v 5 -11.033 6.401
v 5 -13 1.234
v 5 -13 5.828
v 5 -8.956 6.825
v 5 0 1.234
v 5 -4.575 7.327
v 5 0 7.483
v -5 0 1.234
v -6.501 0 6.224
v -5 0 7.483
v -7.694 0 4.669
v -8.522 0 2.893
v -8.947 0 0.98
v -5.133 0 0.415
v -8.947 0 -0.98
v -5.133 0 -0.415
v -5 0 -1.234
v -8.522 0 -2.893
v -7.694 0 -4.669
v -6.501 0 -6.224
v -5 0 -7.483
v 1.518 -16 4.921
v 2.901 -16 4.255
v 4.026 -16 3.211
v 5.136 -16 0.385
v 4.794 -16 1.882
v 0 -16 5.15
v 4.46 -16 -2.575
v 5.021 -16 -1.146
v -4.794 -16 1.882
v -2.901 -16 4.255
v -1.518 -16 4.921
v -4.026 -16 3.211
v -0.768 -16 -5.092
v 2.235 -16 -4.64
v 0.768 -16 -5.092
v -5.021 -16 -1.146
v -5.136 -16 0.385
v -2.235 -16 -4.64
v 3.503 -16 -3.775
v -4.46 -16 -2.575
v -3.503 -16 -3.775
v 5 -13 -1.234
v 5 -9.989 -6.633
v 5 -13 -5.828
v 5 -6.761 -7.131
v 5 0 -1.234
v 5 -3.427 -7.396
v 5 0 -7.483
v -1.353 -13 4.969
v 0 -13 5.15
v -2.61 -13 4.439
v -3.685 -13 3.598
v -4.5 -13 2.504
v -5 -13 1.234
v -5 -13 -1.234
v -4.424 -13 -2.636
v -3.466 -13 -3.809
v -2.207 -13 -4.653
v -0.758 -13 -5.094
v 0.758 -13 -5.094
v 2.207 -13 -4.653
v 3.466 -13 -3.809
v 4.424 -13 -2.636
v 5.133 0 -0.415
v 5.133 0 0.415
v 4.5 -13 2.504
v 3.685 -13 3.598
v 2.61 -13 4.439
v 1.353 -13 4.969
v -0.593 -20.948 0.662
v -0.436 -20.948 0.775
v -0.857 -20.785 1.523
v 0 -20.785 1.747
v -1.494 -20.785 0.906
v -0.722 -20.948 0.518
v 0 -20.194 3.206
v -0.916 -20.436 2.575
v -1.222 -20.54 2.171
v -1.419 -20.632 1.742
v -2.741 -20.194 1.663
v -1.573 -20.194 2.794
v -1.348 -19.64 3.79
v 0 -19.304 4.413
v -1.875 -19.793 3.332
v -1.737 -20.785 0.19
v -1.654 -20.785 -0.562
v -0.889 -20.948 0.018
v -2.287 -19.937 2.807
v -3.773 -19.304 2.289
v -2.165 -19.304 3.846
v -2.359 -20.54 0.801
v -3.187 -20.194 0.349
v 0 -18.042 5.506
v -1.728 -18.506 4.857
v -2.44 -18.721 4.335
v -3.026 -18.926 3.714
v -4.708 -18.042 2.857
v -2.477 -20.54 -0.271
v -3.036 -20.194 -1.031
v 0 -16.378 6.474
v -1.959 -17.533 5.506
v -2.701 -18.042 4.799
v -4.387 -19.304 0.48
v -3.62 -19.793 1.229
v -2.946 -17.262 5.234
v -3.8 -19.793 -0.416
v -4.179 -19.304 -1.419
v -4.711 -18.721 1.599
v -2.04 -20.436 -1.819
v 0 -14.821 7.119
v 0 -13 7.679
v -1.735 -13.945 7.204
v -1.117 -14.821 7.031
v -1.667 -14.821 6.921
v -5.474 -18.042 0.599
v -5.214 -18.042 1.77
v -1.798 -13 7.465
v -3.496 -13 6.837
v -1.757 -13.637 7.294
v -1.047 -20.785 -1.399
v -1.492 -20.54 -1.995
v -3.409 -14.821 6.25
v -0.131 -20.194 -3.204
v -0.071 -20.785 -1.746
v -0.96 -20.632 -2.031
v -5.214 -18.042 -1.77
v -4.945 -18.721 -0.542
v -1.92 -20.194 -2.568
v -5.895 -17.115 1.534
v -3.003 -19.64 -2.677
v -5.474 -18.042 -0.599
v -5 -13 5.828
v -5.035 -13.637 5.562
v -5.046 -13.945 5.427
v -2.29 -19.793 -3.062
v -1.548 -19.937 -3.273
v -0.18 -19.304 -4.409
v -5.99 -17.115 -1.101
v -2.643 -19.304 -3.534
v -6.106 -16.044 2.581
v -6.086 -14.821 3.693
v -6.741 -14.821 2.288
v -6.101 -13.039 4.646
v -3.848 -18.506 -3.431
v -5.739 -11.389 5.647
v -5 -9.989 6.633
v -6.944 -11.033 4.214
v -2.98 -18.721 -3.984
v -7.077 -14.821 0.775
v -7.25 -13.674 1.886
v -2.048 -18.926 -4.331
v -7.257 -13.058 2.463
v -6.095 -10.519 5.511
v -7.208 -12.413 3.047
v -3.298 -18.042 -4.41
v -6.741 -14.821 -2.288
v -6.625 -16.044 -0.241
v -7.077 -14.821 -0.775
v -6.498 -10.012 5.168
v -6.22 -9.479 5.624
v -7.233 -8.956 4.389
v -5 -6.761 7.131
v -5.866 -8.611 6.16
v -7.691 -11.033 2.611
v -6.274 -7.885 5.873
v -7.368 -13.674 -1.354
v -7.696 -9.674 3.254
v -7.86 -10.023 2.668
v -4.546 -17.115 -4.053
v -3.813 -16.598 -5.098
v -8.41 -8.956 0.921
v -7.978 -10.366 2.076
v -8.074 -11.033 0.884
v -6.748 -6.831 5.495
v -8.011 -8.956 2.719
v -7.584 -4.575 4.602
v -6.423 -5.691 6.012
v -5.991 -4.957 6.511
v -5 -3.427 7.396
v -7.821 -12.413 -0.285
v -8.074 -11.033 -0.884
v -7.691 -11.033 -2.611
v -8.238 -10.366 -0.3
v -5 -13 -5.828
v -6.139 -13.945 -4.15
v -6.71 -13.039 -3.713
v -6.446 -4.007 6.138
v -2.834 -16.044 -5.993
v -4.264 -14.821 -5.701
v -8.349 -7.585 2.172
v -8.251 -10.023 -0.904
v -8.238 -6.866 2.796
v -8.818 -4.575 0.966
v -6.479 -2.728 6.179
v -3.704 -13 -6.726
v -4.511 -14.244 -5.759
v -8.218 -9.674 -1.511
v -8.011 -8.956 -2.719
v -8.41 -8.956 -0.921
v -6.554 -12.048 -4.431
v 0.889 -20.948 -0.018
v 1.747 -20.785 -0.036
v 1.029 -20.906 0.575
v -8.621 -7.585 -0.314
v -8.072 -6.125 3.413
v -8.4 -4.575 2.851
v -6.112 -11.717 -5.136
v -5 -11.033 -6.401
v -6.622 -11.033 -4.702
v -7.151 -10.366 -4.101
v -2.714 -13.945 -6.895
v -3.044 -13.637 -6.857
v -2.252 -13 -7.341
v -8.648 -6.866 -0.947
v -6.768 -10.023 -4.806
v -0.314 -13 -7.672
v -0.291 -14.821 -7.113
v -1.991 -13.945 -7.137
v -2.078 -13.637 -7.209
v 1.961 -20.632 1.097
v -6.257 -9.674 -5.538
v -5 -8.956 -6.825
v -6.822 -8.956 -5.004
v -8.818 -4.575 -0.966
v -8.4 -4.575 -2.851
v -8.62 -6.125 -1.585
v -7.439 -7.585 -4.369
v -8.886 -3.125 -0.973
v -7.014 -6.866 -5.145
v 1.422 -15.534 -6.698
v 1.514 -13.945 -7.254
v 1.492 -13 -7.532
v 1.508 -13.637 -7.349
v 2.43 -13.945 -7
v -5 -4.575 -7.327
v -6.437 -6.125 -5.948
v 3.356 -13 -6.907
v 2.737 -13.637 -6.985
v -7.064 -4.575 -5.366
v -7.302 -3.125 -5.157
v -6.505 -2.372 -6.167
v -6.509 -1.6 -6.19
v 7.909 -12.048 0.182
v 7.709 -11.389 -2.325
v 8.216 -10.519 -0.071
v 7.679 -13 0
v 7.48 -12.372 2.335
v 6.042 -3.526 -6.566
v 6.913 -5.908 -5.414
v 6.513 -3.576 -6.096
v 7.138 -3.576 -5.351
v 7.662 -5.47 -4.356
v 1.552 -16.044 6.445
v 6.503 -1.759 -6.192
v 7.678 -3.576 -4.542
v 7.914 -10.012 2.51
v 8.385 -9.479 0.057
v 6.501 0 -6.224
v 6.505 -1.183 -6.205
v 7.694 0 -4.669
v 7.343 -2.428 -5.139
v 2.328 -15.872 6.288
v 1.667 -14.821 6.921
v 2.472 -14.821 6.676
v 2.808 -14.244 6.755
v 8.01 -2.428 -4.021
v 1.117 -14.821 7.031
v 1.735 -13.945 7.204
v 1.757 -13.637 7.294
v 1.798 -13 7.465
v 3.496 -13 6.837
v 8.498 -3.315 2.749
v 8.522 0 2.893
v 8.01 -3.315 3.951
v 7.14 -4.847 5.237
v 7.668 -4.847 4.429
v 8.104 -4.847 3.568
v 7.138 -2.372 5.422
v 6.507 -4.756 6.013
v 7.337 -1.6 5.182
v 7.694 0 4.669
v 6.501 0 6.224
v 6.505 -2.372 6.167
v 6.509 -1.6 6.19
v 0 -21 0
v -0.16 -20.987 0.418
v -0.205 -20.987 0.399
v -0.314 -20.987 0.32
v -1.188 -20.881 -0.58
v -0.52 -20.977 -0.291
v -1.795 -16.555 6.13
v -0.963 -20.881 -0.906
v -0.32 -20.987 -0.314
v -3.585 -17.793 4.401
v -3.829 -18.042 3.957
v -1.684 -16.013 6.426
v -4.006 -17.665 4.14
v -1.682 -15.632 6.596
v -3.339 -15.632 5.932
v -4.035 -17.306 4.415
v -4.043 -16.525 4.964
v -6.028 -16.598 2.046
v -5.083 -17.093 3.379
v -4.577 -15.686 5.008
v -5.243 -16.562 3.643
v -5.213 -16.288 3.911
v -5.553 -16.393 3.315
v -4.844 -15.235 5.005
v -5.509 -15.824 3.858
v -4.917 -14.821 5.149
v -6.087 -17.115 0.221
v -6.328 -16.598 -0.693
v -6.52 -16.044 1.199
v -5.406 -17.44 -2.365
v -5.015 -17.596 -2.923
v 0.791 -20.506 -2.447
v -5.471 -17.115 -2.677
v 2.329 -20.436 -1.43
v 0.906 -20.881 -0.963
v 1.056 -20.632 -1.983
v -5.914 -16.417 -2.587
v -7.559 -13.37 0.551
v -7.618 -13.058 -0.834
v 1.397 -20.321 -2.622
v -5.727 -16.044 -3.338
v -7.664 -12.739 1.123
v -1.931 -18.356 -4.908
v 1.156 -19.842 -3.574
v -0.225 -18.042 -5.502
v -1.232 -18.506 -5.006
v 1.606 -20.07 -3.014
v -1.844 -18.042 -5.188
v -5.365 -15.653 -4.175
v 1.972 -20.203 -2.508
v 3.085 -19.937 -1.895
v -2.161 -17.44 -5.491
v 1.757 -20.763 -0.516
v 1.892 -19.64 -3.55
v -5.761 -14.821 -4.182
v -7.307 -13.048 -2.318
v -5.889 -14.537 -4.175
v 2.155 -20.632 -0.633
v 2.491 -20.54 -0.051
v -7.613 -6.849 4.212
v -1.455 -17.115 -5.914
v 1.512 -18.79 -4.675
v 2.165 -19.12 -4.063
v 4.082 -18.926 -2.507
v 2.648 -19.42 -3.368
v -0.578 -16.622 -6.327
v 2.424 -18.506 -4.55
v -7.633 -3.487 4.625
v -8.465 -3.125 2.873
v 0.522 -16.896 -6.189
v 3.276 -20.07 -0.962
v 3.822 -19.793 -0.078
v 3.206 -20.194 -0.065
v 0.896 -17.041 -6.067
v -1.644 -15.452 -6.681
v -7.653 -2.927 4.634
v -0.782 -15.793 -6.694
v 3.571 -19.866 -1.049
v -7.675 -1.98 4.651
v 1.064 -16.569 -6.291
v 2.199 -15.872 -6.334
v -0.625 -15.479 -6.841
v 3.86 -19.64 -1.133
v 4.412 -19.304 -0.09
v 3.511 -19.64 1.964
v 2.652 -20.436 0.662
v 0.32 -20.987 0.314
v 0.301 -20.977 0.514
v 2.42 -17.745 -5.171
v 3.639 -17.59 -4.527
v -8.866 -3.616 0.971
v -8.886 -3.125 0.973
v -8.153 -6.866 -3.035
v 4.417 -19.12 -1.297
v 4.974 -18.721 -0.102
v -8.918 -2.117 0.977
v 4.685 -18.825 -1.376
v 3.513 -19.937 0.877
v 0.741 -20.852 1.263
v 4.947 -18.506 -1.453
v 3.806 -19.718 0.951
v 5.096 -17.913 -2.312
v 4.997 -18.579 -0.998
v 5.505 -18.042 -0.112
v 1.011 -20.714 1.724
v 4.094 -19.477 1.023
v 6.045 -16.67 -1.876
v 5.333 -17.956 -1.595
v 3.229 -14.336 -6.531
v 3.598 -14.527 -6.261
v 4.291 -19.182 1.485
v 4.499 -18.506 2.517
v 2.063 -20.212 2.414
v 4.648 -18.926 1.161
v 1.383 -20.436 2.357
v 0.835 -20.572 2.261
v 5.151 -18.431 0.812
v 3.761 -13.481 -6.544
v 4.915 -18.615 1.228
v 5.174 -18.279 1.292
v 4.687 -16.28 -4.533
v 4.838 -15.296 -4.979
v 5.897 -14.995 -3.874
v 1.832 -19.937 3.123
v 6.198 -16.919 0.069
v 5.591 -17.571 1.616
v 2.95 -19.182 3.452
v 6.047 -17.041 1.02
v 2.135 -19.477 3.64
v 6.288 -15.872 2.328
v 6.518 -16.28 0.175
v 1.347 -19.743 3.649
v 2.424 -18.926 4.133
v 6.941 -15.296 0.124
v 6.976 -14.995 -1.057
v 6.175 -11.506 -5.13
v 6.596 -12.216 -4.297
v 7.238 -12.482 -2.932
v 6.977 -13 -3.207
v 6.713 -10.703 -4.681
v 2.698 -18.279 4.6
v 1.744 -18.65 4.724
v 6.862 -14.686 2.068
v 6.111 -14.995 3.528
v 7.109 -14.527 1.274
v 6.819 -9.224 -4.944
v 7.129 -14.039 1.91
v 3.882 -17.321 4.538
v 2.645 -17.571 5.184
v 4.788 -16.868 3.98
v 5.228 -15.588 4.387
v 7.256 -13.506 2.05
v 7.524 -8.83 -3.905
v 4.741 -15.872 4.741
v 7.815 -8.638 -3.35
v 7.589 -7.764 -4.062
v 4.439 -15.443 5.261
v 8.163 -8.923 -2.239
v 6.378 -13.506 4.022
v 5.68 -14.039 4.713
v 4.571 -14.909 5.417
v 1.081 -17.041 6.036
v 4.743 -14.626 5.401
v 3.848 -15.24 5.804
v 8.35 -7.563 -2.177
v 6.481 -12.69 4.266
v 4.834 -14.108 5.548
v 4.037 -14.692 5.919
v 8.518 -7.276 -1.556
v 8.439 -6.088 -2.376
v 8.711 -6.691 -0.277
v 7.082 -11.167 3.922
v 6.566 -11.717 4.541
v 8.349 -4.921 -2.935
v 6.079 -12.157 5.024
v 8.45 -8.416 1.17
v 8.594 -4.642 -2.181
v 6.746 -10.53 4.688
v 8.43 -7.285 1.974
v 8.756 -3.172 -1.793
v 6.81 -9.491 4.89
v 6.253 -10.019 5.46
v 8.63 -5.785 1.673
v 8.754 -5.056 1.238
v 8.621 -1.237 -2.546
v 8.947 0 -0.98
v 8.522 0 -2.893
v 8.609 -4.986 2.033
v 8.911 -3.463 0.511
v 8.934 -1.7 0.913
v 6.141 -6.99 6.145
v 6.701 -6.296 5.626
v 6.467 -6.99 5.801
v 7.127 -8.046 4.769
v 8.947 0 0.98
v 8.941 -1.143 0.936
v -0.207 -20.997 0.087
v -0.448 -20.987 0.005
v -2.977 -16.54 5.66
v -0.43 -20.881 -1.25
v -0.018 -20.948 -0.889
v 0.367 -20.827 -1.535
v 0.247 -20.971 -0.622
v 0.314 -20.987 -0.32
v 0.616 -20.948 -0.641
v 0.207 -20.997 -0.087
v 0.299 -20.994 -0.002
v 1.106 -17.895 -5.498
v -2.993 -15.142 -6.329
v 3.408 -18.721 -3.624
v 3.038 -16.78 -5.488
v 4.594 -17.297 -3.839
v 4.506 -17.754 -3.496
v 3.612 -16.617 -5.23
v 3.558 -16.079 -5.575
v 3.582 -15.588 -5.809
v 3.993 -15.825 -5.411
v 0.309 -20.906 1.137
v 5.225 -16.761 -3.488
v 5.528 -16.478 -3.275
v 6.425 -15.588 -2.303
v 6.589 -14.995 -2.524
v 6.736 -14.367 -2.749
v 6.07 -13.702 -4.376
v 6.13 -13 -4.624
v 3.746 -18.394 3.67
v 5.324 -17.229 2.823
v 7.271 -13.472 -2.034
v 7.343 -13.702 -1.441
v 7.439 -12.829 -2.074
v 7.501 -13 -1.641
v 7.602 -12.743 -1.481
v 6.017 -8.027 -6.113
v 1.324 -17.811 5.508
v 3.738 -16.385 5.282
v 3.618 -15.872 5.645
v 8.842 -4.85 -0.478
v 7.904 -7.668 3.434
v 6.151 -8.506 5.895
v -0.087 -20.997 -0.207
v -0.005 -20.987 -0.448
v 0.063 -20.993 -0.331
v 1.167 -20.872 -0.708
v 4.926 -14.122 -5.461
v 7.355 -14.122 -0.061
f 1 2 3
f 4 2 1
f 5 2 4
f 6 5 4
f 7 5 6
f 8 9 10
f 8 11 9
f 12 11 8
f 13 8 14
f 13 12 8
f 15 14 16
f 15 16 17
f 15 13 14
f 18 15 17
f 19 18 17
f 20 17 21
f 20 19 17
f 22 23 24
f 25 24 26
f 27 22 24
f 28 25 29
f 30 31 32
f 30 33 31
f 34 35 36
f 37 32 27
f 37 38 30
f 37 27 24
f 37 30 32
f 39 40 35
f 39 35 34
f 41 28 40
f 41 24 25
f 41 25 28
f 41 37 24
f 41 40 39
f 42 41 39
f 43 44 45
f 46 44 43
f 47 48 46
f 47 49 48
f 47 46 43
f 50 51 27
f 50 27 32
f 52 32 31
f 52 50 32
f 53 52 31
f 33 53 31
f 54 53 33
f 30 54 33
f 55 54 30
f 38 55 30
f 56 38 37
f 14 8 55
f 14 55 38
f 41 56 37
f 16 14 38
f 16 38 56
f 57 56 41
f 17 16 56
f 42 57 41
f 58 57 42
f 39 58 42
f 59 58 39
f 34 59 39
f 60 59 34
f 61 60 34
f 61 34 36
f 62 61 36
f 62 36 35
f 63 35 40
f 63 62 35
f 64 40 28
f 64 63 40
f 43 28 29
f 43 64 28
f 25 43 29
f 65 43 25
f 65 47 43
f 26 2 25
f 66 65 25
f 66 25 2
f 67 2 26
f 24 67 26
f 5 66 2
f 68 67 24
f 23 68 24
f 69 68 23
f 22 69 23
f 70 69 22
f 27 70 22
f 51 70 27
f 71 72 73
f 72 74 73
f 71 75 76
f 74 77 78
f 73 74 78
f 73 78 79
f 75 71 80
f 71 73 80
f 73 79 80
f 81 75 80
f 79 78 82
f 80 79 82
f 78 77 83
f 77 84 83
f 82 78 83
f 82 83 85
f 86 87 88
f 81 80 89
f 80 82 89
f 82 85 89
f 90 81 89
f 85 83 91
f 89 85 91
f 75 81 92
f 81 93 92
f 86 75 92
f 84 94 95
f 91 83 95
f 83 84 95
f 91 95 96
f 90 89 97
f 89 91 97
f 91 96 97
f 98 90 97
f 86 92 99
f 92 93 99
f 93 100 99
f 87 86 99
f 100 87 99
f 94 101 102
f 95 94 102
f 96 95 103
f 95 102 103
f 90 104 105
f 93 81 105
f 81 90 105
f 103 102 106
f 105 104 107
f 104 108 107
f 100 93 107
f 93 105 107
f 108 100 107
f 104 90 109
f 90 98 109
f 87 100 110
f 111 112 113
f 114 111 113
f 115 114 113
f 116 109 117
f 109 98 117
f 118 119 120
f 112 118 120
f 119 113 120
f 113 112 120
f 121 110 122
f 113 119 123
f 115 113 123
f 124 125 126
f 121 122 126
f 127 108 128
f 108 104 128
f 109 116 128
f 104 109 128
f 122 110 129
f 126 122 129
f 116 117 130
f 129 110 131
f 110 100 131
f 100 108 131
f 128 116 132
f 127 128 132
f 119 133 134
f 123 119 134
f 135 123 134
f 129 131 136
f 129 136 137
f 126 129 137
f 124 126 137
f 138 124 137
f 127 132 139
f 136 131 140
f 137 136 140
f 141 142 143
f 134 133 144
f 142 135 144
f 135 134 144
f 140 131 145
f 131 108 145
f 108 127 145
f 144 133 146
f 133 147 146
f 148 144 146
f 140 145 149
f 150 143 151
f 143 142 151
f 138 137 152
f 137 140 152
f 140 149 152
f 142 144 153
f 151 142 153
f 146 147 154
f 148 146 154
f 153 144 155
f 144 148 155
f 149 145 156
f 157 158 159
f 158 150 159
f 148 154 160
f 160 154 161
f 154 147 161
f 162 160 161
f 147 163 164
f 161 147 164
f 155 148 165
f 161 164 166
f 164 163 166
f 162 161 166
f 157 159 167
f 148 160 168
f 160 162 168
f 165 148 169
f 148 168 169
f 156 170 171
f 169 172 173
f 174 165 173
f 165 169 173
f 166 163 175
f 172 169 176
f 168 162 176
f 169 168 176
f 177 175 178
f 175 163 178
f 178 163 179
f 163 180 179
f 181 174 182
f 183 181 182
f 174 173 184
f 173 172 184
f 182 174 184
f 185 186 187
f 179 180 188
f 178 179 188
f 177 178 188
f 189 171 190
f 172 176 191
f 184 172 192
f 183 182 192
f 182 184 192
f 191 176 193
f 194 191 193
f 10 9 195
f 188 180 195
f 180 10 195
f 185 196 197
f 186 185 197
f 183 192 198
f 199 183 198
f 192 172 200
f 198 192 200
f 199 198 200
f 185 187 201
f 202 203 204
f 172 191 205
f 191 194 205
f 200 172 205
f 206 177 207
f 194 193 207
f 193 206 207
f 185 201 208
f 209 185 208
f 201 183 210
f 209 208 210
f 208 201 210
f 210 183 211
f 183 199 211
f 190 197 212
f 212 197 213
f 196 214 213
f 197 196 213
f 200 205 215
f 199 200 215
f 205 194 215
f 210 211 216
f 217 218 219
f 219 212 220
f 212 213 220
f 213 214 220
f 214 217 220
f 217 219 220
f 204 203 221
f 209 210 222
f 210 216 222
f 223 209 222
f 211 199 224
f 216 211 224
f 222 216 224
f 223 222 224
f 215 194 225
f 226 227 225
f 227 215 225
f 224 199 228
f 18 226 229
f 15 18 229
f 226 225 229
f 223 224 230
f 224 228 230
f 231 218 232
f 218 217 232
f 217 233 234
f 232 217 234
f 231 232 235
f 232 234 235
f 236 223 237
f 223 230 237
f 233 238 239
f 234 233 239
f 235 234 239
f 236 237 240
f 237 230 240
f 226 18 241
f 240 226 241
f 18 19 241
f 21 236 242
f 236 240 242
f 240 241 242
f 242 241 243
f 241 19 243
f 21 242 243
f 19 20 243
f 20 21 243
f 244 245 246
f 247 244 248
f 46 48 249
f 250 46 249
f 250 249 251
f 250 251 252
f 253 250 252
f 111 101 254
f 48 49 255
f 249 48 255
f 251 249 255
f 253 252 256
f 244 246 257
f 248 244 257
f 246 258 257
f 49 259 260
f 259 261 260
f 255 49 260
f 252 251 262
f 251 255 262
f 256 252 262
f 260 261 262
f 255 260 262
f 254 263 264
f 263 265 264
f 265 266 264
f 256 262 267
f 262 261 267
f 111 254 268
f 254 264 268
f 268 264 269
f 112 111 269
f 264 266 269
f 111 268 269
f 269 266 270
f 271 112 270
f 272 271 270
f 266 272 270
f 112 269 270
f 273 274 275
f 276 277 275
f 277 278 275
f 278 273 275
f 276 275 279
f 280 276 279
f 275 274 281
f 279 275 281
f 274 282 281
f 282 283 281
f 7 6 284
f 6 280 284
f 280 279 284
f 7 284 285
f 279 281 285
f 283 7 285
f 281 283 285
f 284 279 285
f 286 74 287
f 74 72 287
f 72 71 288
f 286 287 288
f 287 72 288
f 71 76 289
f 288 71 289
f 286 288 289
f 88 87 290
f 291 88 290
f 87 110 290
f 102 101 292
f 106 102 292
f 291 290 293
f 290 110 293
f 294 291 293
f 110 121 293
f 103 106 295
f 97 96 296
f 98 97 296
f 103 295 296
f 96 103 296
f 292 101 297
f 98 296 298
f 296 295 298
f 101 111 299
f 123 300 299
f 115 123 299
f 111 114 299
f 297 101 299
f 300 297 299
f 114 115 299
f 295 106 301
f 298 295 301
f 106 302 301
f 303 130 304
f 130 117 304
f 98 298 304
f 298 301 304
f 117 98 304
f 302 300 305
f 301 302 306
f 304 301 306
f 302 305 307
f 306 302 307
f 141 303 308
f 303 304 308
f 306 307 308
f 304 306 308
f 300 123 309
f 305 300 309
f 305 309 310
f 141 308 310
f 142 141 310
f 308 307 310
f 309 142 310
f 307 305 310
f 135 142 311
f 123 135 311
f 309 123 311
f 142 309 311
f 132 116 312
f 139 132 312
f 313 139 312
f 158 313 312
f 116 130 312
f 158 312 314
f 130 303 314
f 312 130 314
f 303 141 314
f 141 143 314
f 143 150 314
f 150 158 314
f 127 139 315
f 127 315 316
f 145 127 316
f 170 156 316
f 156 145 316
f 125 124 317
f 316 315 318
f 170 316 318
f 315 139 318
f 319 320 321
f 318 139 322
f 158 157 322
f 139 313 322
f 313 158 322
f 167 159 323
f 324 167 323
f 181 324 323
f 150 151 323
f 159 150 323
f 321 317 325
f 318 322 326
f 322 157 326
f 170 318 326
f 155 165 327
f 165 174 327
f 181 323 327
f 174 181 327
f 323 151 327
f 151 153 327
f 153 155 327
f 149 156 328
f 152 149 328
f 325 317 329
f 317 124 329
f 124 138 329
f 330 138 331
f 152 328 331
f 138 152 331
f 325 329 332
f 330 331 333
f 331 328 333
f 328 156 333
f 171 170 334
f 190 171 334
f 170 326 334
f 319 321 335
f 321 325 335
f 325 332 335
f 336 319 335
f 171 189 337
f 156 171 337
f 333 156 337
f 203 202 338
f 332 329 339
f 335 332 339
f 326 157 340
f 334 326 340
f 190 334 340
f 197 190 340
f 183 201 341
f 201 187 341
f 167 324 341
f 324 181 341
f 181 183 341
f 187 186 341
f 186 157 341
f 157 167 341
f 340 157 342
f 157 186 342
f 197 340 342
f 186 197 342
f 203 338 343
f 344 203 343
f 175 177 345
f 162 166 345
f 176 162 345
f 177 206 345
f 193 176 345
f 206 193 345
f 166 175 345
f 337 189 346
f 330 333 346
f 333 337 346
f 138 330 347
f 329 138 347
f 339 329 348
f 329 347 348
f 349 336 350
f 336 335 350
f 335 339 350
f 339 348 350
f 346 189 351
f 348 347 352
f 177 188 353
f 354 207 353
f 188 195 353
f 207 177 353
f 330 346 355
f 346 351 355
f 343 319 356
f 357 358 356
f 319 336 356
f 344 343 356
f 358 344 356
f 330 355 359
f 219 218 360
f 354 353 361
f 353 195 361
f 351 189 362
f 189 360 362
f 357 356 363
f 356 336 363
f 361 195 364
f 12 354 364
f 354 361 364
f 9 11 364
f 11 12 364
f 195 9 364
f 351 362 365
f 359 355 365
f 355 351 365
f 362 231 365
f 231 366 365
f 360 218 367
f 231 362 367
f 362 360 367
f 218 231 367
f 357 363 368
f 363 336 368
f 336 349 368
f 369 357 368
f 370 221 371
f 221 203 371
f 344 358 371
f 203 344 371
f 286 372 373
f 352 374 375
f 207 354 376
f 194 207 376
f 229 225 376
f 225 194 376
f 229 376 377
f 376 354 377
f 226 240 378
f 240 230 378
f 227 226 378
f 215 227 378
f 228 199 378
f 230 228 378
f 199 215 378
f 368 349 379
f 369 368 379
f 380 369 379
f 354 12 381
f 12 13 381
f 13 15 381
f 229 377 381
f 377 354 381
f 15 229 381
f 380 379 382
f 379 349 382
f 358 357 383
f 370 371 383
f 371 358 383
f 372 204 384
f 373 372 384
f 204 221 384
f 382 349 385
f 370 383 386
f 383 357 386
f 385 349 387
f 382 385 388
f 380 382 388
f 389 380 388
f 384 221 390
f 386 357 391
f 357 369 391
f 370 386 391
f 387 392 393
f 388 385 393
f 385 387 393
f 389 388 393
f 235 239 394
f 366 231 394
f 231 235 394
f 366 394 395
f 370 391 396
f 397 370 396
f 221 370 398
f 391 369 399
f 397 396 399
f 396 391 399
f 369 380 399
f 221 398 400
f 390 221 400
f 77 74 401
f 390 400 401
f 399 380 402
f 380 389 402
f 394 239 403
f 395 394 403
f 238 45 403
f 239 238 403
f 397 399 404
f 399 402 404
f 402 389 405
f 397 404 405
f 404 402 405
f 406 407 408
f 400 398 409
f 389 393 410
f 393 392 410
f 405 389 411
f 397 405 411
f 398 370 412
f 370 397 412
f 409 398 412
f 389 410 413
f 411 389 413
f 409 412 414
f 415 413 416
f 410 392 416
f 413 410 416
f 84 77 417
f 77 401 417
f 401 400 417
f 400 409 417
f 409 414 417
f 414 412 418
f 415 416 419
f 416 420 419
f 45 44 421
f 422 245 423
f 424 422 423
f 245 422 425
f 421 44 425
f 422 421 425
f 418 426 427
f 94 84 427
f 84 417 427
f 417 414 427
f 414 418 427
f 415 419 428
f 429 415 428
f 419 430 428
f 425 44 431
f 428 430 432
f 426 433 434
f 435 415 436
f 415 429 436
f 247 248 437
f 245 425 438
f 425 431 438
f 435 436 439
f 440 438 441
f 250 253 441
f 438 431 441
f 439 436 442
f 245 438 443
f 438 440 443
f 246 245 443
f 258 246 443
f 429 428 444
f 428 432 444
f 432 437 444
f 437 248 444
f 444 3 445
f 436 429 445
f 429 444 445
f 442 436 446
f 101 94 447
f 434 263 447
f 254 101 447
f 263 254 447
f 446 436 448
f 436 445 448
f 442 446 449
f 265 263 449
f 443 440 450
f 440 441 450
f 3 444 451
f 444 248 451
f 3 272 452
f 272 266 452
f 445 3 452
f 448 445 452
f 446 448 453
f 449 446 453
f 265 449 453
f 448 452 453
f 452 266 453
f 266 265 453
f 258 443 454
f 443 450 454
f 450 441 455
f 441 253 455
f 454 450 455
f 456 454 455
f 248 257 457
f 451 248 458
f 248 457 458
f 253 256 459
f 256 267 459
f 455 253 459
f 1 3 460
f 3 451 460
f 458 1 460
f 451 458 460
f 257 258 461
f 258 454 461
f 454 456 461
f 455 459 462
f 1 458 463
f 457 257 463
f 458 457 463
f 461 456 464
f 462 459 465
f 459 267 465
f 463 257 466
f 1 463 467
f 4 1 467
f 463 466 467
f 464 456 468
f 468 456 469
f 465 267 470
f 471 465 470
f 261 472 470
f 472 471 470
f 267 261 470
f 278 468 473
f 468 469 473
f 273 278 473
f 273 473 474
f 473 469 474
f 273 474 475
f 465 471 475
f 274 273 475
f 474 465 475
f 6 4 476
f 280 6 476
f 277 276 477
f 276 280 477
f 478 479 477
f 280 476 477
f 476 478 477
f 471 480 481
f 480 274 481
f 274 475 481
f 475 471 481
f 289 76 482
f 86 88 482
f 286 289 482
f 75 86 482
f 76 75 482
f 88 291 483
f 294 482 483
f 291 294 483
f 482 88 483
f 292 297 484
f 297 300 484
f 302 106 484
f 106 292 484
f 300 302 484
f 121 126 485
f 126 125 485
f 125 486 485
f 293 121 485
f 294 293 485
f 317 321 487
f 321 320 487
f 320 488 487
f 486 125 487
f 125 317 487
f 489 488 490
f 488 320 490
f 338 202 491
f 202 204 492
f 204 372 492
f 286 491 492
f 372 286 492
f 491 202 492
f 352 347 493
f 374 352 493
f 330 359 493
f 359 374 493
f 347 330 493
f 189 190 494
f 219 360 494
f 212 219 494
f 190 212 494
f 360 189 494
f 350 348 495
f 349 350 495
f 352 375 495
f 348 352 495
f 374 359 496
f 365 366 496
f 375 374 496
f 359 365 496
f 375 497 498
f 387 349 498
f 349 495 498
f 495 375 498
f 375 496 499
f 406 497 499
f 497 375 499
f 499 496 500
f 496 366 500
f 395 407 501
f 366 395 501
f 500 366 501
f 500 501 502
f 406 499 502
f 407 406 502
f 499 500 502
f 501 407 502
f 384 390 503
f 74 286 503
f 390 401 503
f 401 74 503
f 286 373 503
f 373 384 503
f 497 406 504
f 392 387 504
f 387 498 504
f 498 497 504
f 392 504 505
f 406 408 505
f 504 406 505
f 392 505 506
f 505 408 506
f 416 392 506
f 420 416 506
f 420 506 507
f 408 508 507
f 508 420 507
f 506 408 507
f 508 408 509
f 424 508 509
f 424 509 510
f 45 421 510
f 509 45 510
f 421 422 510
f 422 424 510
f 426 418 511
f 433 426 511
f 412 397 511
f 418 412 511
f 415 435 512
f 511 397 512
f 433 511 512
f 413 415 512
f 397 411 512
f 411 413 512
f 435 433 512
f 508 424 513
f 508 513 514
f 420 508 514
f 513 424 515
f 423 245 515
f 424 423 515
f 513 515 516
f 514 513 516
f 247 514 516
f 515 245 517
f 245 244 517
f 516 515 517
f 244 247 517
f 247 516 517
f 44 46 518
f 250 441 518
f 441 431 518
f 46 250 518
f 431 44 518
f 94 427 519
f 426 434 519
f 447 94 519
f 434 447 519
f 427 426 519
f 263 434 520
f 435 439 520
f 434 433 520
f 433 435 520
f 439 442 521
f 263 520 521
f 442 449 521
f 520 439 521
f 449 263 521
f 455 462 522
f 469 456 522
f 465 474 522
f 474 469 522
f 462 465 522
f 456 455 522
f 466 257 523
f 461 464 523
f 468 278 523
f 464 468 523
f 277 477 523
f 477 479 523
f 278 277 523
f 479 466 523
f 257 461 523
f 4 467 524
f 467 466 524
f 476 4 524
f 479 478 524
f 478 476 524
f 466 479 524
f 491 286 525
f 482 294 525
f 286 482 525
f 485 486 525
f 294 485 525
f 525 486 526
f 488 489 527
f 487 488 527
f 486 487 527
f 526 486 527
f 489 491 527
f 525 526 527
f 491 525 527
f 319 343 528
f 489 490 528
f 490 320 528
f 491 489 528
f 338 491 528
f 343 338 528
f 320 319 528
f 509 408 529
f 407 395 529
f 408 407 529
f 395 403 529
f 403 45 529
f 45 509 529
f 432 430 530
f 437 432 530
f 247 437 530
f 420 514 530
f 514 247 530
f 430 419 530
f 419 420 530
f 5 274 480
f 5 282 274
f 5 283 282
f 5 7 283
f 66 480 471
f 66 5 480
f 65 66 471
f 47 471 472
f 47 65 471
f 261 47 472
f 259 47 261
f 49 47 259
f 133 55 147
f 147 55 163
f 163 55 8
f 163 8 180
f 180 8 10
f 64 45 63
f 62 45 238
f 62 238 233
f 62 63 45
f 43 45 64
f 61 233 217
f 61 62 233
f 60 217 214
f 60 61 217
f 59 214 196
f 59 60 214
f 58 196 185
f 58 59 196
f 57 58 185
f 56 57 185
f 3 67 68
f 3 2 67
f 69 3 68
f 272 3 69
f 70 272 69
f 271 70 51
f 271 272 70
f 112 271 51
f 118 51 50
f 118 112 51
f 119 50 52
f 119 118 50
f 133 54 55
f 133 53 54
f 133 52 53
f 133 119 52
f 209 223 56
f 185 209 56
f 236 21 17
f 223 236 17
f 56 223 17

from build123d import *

# Parameters (mm, degrees)
F2_W     = 10
F2_H     = 18
F3_DEPTH = 13


with BuildPart() as f1:
    # F0 (on Right) → F1 (revolve)
    with BuildSketch(Plane.YZ):
        with BuildLine():
            Line((-16, 5.15), (0, 5.15))
            Line((0, 5.15), (0, 9))
            add(Edge.make_bspline(
                [(-21, 0), (-21, 5.15), (-16, 8.955878), (0, 9)],
                knots=[0, 0, 0, 0, 22.847319, 22.847319, 22.847319, 22.847319], degree=3))
            Line((-21, 0), (-16, 0))
            Line((-16, 0), (-16, 5.15))
        make_face()
    revolve(axis=Axis((0, -18.5, 0), (0, -1, 0)))

    # F2 (on face) → F3 (cut)
    with BuildSketch(Plane(origin=(0, 0, 0), x_dir=(-1, 0, 0), z_dir=(0, 1, 0))):
        Rectangle(F2_W, F2_H)
    extrude(amount=-F3_DEPTH, mode=Mode.SUBTRACT)


solid = f1.part
